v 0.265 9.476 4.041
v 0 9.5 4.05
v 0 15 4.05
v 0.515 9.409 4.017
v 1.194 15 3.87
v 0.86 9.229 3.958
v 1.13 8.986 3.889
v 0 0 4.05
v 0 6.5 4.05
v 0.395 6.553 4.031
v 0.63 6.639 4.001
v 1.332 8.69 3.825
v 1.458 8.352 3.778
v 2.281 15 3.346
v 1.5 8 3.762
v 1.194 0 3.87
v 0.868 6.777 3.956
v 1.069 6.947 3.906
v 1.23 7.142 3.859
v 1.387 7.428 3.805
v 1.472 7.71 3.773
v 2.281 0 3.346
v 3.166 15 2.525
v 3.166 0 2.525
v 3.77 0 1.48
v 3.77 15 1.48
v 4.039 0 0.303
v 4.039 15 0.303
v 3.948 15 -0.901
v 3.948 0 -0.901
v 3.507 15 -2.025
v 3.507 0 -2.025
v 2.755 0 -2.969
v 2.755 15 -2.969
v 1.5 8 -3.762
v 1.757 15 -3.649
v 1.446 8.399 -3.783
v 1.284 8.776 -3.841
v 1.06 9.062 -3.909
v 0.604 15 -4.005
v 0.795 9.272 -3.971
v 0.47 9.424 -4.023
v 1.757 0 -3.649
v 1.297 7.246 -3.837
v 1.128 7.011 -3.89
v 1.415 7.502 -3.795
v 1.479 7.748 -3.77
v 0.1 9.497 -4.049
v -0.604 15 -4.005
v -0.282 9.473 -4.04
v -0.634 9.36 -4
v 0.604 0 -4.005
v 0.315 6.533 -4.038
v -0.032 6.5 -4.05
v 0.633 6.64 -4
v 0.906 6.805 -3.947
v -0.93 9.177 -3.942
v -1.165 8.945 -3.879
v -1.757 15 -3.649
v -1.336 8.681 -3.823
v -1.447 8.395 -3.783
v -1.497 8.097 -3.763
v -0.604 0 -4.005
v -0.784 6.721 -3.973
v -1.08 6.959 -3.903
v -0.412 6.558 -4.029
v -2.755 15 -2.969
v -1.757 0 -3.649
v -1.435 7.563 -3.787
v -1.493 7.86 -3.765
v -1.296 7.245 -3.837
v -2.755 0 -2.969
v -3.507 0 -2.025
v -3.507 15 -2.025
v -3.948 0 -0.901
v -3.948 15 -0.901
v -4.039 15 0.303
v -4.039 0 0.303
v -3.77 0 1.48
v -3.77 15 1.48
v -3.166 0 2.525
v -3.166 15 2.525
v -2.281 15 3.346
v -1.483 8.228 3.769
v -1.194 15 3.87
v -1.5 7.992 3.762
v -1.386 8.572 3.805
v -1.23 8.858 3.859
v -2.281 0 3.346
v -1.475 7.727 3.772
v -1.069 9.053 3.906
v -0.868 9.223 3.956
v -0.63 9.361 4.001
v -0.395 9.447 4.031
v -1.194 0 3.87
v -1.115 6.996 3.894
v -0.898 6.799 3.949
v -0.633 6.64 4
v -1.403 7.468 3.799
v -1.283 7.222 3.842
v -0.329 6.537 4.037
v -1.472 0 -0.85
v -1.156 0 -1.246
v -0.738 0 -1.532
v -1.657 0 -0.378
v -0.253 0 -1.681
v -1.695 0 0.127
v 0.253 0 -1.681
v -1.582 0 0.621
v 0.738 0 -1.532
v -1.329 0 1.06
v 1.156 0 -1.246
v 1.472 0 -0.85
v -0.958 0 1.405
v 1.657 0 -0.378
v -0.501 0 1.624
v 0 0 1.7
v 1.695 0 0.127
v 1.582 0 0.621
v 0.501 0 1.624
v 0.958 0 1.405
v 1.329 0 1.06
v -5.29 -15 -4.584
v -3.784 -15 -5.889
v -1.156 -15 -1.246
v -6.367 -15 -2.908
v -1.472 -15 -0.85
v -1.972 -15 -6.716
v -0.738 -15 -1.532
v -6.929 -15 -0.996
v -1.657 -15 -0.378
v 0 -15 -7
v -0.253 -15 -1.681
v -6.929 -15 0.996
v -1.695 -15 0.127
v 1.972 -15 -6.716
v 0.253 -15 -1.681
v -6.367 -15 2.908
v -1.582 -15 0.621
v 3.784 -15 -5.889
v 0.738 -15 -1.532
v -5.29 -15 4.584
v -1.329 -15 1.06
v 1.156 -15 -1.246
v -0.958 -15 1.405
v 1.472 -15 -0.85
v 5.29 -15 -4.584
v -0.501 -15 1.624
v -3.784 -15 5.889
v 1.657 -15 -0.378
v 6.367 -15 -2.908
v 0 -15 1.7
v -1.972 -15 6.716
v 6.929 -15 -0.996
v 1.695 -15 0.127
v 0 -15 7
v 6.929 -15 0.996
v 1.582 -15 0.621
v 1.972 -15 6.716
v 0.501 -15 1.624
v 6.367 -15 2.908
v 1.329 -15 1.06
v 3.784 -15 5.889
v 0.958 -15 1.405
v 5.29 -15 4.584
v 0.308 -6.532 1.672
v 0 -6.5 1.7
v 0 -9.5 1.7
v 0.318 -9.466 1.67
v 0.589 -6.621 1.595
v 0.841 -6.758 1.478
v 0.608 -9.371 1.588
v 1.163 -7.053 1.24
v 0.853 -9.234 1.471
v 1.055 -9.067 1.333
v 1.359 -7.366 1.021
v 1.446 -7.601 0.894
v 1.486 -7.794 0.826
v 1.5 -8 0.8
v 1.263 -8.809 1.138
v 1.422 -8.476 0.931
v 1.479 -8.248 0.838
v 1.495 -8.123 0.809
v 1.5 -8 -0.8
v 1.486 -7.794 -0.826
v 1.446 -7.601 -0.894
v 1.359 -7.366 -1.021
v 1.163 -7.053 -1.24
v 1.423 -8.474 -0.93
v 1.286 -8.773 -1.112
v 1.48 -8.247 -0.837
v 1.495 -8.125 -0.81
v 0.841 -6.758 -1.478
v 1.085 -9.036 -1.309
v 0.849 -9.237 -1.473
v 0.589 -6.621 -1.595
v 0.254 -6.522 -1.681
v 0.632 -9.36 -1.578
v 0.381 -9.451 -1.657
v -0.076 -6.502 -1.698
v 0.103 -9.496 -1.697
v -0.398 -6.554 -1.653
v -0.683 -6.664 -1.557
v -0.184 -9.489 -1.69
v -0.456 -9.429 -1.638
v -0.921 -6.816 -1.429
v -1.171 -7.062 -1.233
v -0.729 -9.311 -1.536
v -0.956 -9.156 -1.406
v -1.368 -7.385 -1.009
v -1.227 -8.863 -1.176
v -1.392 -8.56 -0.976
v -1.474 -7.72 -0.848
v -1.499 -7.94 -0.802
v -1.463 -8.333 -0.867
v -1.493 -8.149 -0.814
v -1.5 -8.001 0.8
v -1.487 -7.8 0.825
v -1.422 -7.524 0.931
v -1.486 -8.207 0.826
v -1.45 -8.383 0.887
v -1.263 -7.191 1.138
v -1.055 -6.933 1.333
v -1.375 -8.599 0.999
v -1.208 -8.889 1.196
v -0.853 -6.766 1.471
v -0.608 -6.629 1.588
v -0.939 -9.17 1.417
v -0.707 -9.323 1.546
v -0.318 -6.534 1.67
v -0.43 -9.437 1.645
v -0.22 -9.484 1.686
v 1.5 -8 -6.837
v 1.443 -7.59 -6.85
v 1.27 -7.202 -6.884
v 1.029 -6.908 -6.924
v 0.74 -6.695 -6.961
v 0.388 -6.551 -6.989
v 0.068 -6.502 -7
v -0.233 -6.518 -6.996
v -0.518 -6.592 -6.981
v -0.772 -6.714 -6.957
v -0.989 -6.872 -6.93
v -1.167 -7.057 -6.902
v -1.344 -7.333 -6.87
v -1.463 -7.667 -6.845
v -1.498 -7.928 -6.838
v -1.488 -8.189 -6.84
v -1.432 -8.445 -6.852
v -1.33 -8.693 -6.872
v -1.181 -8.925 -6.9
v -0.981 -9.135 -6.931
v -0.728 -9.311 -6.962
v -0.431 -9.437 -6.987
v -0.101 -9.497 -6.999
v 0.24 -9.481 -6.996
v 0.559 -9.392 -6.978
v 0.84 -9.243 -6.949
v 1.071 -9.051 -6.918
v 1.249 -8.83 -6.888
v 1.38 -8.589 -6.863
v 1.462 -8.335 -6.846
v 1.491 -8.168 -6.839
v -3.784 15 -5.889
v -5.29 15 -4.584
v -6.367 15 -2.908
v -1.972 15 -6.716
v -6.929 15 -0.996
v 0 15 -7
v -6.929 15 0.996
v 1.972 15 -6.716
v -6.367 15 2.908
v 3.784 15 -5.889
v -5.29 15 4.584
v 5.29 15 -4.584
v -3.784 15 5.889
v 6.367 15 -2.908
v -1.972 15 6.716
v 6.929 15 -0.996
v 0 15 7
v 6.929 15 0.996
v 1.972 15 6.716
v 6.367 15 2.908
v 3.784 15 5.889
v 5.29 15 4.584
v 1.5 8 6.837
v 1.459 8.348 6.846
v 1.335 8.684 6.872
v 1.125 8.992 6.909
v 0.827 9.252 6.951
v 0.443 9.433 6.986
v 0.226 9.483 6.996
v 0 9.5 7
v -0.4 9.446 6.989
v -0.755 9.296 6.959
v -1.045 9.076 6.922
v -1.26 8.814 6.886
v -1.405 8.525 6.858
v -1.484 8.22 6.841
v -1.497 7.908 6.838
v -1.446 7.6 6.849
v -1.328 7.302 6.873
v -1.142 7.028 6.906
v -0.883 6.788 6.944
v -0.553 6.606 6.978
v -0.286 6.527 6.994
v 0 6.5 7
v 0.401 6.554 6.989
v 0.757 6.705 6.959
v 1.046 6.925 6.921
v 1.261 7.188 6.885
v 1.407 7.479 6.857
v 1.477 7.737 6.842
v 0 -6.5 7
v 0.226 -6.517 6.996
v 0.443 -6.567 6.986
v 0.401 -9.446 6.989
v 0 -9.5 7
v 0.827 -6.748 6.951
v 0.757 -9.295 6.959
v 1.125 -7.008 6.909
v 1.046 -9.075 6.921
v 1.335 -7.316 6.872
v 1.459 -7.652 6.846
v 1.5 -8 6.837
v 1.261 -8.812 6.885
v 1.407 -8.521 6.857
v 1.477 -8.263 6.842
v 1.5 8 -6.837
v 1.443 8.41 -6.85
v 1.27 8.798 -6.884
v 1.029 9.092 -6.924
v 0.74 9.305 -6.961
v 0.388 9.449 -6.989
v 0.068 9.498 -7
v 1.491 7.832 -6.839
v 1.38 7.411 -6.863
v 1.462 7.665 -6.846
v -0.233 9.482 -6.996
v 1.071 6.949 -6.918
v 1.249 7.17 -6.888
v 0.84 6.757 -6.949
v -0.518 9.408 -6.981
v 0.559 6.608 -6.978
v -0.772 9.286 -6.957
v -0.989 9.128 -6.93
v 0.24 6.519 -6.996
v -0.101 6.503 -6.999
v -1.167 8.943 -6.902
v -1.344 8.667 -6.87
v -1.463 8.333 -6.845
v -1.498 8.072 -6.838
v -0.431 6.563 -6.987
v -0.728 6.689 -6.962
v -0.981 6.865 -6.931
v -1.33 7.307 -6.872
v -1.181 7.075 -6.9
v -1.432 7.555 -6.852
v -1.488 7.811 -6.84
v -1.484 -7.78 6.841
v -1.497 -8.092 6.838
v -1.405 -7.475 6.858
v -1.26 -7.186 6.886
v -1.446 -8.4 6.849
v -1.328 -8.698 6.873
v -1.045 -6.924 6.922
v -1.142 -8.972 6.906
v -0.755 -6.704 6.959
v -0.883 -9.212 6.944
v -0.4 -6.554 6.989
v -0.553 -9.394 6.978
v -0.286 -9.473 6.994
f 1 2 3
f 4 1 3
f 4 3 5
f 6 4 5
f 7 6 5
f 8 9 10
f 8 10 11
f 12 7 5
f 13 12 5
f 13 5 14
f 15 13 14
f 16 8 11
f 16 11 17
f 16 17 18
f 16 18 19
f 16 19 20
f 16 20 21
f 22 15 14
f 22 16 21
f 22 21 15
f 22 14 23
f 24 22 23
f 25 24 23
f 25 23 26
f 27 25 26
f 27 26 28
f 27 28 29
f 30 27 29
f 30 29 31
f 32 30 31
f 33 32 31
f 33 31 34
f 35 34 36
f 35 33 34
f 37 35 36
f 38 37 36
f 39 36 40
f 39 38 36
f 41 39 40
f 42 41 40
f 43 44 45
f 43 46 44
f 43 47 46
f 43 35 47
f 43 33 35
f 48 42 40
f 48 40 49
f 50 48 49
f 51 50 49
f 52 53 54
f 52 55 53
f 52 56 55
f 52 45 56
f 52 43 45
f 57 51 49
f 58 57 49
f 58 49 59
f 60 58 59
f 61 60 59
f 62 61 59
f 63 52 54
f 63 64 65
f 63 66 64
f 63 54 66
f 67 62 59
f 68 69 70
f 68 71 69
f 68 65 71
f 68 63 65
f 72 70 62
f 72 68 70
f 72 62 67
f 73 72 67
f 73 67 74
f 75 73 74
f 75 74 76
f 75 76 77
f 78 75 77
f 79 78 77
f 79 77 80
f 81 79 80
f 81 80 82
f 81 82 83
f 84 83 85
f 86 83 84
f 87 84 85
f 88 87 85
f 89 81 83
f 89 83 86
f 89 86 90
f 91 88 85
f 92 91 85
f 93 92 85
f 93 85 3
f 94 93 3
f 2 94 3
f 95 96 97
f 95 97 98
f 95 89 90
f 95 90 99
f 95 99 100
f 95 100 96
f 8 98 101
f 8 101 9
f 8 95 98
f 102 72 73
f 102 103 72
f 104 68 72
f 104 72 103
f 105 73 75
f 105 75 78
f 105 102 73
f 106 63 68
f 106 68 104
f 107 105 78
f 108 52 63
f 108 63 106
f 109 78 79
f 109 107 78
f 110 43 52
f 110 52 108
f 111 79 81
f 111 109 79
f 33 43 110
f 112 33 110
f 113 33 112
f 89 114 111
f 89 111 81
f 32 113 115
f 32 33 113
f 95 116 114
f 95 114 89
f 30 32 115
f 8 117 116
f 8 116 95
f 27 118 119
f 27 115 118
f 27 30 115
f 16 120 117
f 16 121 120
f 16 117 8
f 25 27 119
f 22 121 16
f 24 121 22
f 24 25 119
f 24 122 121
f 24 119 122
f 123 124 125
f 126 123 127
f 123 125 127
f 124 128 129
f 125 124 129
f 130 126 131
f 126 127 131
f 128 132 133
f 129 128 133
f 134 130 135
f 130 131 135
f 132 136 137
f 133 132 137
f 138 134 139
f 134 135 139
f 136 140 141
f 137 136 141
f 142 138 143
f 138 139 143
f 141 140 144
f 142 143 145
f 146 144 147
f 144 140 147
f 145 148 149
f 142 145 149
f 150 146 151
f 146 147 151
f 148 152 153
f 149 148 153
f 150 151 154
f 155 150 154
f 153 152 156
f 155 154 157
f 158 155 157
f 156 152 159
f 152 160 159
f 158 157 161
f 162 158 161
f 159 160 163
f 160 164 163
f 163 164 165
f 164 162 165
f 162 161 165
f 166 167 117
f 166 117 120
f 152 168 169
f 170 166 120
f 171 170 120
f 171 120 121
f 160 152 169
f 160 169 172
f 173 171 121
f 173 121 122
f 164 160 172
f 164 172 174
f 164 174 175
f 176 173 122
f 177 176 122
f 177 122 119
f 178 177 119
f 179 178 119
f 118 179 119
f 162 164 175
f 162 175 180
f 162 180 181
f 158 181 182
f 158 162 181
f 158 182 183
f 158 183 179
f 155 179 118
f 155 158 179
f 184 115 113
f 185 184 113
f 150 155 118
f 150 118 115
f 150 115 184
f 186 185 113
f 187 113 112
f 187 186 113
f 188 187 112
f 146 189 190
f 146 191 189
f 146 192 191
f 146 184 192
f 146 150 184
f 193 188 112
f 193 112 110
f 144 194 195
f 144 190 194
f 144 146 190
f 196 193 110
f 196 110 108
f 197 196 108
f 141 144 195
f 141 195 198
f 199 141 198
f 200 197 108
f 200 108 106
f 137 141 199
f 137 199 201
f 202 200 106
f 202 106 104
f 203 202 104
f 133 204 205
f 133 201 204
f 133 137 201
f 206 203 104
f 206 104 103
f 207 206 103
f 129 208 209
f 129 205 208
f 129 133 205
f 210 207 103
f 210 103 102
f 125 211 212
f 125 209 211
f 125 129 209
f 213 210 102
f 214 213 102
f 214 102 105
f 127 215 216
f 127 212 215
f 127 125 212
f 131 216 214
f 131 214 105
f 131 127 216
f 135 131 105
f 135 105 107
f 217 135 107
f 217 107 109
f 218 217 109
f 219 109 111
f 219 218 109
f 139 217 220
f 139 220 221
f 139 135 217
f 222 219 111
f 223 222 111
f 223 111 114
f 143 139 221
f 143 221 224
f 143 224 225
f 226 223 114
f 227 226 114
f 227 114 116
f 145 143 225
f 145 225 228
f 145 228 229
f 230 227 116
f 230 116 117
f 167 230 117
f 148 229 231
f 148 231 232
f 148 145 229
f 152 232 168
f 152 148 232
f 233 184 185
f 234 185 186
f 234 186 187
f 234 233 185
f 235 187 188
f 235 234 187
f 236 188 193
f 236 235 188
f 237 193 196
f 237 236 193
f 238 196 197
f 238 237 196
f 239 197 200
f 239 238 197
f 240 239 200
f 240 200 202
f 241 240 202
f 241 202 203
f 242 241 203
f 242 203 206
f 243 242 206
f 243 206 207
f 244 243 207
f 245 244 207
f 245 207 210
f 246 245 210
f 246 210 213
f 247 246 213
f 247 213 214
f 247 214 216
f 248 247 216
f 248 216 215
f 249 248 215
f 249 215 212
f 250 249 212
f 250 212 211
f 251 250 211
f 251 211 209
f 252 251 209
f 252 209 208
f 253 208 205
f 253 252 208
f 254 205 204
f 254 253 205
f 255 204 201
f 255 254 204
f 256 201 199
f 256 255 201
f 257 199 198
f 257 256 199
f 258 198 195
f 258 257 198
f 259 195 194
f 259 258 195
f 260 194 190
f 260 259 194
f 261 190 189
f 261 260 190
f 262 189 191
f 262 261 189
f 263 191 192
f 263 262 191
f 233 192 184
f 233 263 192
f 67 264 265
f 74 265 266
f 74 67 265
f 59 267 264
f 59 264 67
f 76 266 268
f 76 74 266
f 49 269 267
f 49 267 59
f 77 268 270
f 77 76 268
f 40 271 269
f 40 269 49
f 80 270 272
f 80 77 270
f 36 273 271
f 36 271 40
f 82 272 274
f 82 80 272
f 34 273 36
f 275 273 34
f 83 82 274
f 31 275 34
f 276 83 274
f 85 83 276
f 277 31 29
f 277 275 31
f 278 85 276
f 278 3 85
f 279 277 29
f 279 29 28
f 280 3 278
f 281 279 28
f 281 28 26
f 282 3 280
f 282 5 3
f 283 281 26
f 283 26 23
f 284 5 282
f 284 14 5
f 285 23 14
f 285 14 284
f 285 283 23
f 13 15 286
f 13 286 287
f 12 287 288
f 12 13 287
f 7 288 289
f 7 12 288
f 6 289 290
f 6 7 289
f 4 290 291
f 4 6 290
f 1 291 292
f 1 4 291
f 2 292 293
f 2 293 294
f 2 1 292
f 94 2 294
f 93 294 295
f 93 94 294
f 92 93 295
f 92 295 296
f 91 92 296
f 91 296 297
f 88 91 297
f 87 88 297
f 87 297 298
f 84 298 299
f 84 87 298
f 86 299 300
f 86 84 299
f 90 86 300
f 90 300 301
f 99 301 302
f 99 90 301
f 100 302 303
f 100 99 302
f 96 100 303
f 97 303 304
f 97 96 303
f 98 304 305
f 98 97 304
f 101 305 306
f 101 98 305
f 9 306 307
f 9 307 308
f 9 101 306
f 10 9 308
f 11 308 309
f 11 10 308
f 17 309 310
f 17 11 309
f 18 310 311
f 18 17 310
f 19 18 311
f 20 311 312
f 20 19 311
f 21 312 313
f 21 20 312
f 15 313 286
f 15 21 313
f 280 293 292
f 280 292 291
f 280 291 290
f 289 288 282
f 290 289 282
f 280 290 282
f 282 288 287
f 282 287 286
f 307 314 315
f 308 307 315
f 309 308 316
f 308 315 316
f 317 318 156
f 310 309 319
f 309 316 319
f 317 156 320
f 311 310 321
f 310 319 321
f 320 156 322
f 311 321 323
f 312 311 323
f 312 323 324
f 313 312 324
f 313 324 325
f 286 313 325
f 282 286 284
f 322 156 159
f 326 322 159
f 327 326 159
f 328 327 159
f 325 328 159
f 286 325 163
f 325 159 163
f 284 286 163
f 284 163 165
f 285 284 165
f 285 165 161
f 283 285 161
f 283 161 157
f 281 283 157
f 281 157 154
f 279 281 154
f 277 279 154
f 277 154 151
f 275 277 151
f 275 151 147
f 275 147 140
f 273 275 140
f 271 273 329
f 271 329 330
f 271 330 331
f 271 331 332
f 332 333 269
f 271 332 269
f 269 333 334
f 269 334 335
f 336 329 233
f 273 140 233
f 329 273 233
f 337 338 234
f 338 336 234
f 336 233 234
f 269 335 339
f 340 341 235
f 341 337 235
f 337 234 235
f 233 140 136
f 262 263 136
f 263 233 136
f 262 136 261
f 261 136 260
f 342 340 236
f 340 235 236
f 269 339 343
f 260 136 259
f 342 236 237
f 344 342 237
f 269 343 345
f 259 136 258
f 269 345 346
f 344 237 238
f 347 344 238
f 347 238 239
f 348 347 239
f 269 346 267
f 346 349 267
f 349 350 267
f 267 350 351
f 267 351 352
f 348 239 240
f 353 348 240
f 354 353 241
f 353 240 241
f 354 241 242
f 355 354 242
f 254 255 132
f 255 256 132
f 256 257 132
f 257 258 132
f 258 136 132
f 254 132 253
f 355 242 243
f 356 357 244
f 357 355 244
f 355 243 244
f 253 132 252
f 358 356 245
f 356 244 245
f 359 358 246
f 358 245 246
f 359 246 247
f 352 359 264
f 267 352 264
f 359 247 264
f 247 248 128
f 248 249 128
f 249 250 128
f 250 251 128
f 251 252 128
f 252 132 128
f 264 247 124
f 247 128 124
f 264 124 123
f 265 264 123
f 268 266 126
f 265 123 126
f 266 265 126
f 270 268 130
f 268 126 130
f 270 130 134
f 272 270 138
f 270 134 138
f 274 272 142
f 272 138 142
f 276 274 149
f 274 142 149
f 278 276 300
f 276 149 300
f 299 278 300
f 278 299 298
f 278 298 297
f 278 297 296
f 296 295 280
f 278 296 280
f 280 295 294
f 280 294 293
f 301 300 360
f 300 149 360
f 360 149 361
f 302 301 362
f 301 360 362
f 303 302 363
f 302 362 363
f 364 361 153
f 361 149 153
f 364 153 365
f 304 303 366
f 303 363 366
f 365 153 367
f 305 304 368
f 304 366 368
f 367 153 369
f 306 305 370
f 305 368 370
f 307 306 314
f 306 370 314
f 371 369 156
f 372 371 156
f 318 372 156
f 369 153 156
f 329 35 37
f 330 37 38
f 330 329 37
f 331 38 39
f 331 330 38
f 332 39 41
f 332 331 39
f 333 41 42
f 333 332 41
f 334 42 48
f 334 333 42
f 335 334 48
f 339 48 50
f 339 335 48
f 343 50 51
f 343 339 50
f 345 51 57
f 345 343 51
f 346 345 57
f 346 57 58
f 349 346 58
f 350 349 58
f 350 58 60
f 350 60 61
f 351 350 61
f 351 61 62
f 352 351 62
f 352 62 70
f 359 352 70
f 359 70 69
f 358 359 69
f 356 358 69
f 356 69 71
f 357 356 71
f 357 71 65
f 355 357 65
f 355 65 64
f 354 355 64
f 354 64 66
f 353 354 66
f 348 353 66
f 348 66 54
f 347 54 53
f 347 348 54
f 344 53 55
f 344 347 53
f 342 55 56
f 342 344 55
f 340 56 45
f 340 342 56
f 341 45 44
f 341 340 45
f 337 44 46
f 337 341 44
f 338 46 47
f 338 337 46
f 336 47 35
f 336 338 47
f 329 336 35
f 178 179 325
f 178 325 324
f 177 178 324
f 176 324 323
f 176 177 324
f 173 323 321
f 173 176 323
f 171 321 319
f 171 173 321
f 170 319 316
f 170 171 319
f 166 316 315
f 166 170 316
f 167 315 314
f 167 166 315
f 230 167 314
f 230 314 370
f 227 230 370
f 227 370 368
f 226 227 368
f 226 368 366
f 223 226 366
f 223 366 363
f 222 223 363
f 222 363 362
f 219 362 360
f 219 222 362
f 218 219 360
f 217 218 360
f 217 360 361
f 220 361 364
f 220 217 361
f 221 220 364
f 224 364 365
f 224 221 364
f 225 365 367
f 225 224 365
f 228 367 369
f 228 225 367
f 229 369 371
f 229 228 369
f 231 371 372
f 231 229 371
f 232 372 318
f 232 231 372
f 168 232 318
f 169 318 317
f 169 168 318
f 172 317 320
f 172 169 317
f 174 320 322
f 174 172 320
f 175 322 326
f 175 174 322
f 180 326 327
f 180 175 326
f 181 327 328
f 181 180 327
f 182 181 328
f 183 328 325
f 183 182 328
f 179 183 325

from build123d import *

# Parameters (mm, degrees)
SKETCH1_R               = 7
SKETCH1_R_2             = 4.05
BOSS_EXTRUDE1_DEPTH     = 15
BOSS_EXTRUDE2_START     = -15
SKETCH1_3_R             = 7
SKETCH1_3_R_2           = 1.7
BOSS_EXTRUDE2_DEPTH     = 15
CUT_EXTRUDE1_DEPTH      = 18.972200756
CUT_EXTRUDE1_DEPTH_BACK = 18.972200756
SKETCH2_R               = 1.5


with BuildPart() as part:
    # Sketch1 → Boss-Extrude1 (new body)
    with BuildSketch(Plane(origin=(0, 0, 0), x_dir=(1, 0, 0), z_dir=(0, 1, 0))):
        Circle(SKETCH1_R)
        Circle(SKETCH1_R_2, mode=Mode.SUBTRACT)
    extrude(amount=BOSS_EXTRUDE1_DEPTH)

    # Sketch1<3> → Boss-Extrude2 (add)
    with BuildSketch(Plane(origin=(0, 0, 0), x_dir=(1, 0, 0), z_dir=(0, 1, 0)).offset(BOSS_EXTRUDE2_START)):
        Circle(SKETCH1_3_R)
        Circle(SKETCH1_3_R_2, mode=Mode.SUBTRACT)
    extrude(amount=BOSS_EXTRUDE2_DEPTH)

    # Sketch2 → Cut-Extrude1 (cut, two sides: drawn at the far end of the back side and taken through both)
    with BuildSketch(Plane.XY.offset(-CUT_EXTRUDE1_DEPTH_BACK)):
        with Locations((0, 8)):
            Circle(SKETCH2_R)
        with Locations((0, -8)):
            Circle(SKETCH2_R)
    extrude(amount=CUT_EXTRUDE1_DEPTH + CUT_EXTRUDE1_DEPTH_BACK, mode=Mode.SUBTRACT)


solid = part.part
